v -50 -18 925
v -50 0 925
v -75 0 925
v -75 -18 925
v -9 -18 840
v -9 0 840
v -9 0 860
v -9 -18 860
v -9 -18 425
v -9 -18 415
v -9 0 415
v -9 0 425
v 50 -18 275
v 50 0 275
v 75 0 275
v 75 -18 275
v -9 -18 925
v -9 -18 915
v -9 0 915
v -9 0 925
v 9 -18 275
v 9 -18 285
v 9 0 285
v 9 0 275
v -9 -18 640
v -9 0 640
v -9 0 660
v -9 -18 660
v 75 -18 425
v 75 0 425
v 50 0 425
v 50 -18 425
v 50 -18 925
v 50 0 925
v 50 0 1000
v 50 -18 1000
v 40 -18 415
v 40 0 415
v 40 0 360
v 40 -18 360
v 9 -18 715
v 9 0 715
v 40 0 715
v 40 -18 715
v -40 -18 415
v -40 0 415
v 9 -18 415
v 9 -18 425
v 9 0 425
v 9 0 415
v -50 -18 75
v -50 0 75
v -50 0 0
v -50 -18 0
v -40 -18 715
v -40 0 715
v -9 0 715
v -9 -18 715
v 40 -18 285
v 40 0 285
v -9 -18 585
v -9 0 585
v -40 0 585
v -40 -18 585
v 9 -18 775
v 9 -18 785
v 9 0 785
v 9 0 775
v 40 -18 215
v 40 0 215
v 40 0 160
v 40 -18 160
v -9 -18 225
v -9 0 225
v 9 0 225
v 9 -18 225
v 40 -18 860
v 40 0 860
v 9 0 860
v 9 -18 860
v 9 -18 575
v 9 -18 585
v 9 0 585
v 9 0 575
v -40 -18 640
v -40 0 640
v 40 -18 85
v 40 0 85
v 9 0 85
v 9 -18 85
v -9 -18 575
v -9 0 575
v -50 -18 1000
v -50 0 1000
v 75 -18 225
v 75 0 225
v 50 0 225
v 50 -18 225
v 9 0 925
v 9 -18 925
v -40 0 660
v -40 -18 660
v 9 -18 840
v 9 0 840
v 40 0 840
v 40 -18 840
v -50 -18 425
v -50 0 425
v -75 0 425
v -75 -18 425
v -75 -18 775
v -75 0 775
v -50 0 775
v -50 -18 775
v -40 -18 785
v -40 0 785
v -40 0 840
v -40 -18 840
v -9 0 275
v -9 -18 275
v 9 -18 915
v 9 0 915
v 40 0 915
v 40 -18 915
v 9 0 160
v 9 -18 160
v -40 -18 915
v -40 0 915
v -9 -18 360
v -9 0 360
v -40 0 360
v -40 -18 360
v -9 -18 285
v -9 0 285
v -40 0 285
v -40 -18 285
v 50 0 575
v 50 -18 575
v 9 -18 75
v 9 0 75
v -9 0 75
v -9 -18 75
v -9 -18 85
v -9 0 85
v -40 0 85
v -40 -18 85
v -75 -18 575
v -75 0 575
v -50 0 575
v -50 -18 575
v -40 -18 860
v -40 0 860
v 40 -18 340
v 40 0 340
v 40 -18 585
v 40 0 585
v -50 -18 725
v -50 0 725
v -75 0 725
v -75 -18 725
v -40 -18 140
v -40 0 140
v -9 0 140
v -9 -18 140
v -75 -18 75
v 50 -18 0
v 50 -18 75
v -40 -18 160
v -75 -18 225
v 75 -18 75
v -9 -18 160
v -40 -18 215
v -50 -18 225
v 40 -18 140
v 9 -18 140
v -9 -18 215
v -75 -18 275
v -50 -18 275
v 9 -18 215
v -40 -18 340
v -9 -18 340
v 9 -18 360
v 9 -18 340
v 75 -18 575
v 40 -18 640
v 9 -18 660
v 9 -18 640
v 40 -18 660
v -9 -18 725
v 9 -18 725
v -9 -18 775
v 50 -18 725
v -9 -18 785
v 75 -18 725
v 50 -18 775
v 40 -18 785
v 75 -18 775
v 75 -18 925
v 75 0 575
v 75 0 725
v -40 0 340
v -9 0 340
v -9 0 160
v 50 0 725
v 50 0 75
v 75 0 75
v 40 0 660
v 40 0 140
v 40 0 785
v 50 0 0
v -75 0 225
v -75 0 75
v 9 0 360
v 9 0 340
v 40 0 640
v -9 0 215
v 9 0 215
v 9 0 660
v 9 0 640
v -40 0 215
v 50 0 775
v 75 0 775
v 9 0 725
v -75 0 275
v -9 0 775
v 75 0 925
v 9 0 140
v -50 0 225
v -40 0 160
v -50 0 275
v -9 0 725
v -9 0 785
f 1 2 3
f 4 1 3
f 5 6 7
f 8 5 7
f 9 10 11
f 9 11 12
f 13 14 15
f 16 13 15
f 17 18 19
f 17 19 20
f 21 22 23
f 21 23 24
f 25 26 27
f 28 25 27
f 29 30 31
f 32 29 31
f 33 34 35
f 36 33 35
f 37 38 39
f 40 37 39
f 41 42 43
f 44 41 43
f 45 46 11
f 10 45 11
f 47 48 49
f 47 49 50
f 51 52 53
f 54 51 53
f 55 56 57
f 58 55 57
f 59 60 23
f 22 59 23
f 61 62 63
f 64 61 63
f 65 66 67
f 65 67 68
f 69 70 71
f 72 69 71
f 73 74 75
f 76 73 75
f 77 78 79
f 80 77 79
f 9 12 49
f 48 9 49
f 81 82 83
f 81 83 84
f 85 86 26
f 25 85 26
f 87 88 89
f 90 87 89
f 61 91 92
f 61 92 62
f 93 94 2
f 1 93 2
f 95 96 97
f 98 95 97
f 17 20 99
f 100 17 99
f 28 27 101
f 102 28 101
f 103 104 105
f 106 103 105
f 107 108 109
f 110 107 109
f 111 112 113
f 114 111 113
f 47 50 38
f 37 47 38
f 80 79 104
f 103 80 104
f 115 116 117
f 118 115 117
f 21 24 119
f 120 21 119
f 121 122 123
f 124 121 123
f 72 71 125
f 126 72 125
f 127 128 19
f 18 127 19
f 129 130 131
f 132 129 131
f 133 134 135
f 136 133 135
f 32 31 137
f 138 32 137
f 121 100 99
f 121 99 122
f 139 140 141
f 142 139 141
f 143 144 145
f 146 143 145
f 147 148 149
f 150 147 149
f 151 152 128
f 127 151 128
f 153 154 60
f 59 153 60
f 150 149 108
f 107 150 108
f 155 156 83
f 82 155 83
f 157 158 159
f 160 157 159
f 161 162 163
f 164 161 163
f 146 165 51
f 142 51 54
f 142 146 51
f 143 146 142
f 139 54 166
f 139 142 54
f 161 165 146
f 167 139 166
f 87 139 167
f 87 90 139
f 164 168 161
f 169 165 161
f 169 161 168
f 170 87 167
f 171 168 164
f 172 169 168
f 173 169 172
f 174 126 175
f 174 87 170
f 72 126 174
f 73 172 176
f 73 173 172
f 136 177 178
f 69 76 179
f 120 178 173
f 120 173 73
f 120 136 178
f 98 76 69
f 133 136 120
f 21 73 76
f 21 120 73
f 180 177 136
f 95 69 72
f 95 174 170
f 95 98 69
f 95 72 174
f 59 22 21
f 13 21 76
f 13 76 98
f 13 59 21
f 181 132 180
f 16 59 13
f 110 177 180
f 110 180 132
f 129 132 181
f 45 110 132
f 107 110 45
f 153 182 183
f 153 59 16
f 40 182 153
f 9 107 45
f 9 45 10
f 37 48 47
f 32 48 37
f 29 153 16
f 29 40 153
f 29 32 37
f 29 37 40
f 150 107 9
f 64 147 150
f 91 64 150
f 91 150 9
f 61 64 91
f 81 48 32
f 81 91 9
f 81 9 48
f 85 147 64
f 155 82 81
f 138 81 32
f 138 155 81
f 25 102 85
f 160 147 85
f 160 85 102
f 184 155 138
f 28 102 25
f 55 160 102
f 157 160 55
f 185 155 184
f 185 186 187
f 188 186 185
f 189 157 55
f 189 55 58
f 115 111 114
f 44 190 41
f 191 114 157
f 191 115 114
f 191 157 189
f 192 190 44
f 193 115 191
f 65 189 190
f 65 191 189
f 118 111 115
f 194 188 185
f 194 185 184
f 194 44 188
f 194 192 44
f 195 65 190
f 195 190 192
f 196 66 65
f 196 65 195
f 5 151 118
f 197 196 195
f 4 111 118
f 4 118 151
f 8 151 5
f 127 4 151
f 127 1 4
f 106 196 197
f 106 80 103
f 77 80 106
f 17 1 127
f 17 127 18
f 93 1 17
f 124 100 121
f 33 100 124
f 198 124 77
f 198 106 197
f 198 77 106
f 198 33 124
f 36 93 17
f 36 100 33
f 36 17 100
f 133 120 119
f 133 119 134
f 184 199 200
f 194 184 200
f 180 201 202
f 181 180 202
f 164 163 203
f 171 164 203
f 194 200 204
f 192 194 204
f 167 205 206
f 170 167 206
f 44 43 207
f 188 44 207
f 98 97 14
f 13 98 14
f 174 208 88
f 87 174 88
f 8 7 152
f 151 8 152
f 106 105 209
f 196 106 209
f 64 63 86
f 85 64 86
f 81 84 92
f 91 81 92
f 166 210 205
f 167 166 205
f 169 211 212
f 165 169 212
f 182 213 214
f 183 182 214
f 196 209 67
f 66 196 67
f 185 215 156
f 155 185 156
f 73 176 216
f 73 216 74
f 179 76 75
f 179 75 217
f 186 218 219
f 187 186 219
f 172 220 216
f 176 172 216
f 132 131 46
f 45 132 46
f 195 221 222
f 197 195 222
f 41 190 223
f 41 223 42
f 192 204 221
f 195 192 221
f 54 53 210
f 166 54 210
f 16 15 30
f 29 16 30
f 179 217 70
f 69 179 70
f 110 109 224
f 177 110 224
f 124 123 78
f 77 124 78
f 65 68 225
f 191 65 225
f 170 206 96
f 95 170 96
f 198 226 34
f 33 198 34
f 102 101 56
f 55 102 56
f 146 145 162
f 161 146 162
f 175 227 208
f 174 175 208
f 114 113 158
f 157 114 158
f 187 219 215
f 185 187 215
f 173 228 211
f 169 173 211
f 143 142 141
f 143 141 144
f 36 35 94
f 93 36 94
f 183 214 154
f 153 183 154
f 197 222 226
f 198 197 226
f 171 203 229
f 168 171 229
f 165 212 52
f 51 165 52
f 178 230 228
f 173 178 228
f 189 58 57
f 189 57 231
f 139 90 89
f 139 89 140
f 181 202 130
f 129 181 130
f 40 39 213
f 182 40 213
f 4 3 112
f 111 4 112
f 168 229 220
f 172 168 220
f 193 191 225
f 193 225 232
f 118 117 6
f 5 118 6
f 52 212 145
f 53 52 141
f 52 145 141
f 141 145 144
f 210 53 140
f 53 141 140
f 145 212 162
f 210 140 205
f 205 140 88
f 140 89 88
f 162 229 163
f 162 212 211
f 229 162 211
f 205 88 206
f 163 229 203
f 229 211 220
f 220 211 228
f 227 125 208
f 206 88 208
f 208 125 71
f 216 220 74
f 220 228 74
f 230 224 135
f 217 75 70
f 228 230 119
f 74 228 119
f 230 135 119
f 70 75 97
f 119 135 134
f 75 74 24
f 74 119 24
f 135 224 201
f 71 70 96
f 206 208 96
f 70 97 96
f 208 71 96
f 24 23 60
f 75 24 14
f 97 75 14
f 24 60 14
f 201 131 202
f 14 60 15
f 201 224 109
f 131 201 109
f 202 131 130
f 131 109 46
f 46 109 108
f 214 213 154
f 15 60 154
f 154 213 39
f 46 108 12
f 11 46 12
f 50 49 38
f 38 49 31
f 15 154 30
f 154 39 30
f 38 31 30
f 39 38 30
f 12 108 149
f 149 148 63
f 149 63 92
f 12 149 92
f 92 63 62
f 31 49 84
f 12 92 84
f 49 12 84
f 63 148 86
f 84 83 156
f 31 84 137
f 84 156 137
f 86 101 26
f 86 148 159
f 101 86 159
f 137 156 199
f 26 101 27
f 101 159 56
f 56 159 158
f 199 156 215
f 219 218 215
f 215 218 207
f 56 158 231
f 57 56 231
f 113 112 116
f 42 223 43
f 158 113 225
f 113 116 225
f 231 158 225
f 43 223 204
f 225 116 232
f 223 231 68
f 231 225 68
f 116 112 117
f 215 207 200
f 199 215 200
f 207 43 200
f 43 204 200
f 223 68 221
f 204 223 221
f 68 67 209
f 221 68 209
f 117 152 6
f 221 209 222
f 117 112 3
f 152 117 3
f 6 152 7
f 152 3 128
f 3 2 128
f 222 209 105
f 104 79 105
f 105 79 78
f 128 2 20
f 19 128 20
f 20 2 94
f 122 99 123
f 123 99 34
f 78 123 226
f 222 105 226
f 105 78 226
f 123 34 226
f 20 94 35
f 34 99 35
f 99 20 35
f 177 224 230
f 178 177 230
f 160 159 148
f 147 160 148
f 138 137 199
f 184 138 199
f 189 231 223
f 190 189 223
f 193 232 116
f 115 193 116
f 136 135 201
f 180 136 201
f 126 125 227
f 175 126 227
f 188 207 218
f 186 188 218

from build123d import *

# Parameters (mm, degrees)
F1_DEPTH = 18


with BuildPart() as f1:
    # F0 (on Front) → F1 (new body)
    with BuildSketch(Plane.XZ):
        Polygon((-50, 75), (-50, 0), (50, 0), (50, 75), (75, 75), (75, 225), (50, 225), (50, 275), (75, 275), (75, 425), (50, 425), (50, 575), (75, 575), (75, 725), (50, 725), (50, 775), (75, 775), (75, 925), (50, 925), (50, 1000), (-50, 1000), (-50, 925), (-75, 925), (-75, 775), (-50, 775), (-50, 725), (-75, 725), (-75, 575), (-50, 575), (-50, 425), (-75, 425), (-75, 275), (-50, 275), (-50, 225), (-75, 225), (-75, 75), align=None)
        Polygon((-9, 215), (-9, 225), (9, 225), (9, 215), (40, 215), (40, 160), (9, 160), (9, 140), (40, 140), (40, 85), (9, 85), (9, 75), (-9, 75), (-9, 85), (-40, 85), (-40, 140), (-9, 140), (-9, 160), (-40, 160), (-40, 215), align=None, mode=Mode.SUBTRACT)
        Polygon((-9, 415), (-9, 425), (9, 425), (9, 415), (40, 415), (40, 360), (9, 360), (9, 340), (40, 340), (40, 285), (9, 285), (9, 275), (-9, 275), (-9, 285), (-40, 285), (-40, 340), (-9, 340), (-9, 360), (-40, 360), (-40, 415), align=None, mode=Mode.SUBTRACT)
        Polygon((-9, 715), (-9, 725), (9, 725), (9, 715), (40, 715), (40, 660), (9, 660), (9, 640), (40, 640), (40, 585), (9, 585), (9, 575), (-9, 575), (-9, 585), (-40, 585), (-40, 640), (-9, 640), (-9, 660), (-40, 660), (-40, 715), align=None, mode=Mode.SUBTRACT)
        Polygon((-9, 915), (-9, 925), (9, 925), (9, 915), (40, 915), (40, 860), (9, 860), (9, 840), (40, 840), (40, 785), (9, 785), (9, 775), (-9, 775), (-9, 785), (-40, 785), (-40, 840), (-9, 840), (-9, 860), (-40, 860), (-40, 915), align=None, mode=Mode.SUBTRACT)
    extrude(amount=F1_DEPTH)


solid = f1.part
